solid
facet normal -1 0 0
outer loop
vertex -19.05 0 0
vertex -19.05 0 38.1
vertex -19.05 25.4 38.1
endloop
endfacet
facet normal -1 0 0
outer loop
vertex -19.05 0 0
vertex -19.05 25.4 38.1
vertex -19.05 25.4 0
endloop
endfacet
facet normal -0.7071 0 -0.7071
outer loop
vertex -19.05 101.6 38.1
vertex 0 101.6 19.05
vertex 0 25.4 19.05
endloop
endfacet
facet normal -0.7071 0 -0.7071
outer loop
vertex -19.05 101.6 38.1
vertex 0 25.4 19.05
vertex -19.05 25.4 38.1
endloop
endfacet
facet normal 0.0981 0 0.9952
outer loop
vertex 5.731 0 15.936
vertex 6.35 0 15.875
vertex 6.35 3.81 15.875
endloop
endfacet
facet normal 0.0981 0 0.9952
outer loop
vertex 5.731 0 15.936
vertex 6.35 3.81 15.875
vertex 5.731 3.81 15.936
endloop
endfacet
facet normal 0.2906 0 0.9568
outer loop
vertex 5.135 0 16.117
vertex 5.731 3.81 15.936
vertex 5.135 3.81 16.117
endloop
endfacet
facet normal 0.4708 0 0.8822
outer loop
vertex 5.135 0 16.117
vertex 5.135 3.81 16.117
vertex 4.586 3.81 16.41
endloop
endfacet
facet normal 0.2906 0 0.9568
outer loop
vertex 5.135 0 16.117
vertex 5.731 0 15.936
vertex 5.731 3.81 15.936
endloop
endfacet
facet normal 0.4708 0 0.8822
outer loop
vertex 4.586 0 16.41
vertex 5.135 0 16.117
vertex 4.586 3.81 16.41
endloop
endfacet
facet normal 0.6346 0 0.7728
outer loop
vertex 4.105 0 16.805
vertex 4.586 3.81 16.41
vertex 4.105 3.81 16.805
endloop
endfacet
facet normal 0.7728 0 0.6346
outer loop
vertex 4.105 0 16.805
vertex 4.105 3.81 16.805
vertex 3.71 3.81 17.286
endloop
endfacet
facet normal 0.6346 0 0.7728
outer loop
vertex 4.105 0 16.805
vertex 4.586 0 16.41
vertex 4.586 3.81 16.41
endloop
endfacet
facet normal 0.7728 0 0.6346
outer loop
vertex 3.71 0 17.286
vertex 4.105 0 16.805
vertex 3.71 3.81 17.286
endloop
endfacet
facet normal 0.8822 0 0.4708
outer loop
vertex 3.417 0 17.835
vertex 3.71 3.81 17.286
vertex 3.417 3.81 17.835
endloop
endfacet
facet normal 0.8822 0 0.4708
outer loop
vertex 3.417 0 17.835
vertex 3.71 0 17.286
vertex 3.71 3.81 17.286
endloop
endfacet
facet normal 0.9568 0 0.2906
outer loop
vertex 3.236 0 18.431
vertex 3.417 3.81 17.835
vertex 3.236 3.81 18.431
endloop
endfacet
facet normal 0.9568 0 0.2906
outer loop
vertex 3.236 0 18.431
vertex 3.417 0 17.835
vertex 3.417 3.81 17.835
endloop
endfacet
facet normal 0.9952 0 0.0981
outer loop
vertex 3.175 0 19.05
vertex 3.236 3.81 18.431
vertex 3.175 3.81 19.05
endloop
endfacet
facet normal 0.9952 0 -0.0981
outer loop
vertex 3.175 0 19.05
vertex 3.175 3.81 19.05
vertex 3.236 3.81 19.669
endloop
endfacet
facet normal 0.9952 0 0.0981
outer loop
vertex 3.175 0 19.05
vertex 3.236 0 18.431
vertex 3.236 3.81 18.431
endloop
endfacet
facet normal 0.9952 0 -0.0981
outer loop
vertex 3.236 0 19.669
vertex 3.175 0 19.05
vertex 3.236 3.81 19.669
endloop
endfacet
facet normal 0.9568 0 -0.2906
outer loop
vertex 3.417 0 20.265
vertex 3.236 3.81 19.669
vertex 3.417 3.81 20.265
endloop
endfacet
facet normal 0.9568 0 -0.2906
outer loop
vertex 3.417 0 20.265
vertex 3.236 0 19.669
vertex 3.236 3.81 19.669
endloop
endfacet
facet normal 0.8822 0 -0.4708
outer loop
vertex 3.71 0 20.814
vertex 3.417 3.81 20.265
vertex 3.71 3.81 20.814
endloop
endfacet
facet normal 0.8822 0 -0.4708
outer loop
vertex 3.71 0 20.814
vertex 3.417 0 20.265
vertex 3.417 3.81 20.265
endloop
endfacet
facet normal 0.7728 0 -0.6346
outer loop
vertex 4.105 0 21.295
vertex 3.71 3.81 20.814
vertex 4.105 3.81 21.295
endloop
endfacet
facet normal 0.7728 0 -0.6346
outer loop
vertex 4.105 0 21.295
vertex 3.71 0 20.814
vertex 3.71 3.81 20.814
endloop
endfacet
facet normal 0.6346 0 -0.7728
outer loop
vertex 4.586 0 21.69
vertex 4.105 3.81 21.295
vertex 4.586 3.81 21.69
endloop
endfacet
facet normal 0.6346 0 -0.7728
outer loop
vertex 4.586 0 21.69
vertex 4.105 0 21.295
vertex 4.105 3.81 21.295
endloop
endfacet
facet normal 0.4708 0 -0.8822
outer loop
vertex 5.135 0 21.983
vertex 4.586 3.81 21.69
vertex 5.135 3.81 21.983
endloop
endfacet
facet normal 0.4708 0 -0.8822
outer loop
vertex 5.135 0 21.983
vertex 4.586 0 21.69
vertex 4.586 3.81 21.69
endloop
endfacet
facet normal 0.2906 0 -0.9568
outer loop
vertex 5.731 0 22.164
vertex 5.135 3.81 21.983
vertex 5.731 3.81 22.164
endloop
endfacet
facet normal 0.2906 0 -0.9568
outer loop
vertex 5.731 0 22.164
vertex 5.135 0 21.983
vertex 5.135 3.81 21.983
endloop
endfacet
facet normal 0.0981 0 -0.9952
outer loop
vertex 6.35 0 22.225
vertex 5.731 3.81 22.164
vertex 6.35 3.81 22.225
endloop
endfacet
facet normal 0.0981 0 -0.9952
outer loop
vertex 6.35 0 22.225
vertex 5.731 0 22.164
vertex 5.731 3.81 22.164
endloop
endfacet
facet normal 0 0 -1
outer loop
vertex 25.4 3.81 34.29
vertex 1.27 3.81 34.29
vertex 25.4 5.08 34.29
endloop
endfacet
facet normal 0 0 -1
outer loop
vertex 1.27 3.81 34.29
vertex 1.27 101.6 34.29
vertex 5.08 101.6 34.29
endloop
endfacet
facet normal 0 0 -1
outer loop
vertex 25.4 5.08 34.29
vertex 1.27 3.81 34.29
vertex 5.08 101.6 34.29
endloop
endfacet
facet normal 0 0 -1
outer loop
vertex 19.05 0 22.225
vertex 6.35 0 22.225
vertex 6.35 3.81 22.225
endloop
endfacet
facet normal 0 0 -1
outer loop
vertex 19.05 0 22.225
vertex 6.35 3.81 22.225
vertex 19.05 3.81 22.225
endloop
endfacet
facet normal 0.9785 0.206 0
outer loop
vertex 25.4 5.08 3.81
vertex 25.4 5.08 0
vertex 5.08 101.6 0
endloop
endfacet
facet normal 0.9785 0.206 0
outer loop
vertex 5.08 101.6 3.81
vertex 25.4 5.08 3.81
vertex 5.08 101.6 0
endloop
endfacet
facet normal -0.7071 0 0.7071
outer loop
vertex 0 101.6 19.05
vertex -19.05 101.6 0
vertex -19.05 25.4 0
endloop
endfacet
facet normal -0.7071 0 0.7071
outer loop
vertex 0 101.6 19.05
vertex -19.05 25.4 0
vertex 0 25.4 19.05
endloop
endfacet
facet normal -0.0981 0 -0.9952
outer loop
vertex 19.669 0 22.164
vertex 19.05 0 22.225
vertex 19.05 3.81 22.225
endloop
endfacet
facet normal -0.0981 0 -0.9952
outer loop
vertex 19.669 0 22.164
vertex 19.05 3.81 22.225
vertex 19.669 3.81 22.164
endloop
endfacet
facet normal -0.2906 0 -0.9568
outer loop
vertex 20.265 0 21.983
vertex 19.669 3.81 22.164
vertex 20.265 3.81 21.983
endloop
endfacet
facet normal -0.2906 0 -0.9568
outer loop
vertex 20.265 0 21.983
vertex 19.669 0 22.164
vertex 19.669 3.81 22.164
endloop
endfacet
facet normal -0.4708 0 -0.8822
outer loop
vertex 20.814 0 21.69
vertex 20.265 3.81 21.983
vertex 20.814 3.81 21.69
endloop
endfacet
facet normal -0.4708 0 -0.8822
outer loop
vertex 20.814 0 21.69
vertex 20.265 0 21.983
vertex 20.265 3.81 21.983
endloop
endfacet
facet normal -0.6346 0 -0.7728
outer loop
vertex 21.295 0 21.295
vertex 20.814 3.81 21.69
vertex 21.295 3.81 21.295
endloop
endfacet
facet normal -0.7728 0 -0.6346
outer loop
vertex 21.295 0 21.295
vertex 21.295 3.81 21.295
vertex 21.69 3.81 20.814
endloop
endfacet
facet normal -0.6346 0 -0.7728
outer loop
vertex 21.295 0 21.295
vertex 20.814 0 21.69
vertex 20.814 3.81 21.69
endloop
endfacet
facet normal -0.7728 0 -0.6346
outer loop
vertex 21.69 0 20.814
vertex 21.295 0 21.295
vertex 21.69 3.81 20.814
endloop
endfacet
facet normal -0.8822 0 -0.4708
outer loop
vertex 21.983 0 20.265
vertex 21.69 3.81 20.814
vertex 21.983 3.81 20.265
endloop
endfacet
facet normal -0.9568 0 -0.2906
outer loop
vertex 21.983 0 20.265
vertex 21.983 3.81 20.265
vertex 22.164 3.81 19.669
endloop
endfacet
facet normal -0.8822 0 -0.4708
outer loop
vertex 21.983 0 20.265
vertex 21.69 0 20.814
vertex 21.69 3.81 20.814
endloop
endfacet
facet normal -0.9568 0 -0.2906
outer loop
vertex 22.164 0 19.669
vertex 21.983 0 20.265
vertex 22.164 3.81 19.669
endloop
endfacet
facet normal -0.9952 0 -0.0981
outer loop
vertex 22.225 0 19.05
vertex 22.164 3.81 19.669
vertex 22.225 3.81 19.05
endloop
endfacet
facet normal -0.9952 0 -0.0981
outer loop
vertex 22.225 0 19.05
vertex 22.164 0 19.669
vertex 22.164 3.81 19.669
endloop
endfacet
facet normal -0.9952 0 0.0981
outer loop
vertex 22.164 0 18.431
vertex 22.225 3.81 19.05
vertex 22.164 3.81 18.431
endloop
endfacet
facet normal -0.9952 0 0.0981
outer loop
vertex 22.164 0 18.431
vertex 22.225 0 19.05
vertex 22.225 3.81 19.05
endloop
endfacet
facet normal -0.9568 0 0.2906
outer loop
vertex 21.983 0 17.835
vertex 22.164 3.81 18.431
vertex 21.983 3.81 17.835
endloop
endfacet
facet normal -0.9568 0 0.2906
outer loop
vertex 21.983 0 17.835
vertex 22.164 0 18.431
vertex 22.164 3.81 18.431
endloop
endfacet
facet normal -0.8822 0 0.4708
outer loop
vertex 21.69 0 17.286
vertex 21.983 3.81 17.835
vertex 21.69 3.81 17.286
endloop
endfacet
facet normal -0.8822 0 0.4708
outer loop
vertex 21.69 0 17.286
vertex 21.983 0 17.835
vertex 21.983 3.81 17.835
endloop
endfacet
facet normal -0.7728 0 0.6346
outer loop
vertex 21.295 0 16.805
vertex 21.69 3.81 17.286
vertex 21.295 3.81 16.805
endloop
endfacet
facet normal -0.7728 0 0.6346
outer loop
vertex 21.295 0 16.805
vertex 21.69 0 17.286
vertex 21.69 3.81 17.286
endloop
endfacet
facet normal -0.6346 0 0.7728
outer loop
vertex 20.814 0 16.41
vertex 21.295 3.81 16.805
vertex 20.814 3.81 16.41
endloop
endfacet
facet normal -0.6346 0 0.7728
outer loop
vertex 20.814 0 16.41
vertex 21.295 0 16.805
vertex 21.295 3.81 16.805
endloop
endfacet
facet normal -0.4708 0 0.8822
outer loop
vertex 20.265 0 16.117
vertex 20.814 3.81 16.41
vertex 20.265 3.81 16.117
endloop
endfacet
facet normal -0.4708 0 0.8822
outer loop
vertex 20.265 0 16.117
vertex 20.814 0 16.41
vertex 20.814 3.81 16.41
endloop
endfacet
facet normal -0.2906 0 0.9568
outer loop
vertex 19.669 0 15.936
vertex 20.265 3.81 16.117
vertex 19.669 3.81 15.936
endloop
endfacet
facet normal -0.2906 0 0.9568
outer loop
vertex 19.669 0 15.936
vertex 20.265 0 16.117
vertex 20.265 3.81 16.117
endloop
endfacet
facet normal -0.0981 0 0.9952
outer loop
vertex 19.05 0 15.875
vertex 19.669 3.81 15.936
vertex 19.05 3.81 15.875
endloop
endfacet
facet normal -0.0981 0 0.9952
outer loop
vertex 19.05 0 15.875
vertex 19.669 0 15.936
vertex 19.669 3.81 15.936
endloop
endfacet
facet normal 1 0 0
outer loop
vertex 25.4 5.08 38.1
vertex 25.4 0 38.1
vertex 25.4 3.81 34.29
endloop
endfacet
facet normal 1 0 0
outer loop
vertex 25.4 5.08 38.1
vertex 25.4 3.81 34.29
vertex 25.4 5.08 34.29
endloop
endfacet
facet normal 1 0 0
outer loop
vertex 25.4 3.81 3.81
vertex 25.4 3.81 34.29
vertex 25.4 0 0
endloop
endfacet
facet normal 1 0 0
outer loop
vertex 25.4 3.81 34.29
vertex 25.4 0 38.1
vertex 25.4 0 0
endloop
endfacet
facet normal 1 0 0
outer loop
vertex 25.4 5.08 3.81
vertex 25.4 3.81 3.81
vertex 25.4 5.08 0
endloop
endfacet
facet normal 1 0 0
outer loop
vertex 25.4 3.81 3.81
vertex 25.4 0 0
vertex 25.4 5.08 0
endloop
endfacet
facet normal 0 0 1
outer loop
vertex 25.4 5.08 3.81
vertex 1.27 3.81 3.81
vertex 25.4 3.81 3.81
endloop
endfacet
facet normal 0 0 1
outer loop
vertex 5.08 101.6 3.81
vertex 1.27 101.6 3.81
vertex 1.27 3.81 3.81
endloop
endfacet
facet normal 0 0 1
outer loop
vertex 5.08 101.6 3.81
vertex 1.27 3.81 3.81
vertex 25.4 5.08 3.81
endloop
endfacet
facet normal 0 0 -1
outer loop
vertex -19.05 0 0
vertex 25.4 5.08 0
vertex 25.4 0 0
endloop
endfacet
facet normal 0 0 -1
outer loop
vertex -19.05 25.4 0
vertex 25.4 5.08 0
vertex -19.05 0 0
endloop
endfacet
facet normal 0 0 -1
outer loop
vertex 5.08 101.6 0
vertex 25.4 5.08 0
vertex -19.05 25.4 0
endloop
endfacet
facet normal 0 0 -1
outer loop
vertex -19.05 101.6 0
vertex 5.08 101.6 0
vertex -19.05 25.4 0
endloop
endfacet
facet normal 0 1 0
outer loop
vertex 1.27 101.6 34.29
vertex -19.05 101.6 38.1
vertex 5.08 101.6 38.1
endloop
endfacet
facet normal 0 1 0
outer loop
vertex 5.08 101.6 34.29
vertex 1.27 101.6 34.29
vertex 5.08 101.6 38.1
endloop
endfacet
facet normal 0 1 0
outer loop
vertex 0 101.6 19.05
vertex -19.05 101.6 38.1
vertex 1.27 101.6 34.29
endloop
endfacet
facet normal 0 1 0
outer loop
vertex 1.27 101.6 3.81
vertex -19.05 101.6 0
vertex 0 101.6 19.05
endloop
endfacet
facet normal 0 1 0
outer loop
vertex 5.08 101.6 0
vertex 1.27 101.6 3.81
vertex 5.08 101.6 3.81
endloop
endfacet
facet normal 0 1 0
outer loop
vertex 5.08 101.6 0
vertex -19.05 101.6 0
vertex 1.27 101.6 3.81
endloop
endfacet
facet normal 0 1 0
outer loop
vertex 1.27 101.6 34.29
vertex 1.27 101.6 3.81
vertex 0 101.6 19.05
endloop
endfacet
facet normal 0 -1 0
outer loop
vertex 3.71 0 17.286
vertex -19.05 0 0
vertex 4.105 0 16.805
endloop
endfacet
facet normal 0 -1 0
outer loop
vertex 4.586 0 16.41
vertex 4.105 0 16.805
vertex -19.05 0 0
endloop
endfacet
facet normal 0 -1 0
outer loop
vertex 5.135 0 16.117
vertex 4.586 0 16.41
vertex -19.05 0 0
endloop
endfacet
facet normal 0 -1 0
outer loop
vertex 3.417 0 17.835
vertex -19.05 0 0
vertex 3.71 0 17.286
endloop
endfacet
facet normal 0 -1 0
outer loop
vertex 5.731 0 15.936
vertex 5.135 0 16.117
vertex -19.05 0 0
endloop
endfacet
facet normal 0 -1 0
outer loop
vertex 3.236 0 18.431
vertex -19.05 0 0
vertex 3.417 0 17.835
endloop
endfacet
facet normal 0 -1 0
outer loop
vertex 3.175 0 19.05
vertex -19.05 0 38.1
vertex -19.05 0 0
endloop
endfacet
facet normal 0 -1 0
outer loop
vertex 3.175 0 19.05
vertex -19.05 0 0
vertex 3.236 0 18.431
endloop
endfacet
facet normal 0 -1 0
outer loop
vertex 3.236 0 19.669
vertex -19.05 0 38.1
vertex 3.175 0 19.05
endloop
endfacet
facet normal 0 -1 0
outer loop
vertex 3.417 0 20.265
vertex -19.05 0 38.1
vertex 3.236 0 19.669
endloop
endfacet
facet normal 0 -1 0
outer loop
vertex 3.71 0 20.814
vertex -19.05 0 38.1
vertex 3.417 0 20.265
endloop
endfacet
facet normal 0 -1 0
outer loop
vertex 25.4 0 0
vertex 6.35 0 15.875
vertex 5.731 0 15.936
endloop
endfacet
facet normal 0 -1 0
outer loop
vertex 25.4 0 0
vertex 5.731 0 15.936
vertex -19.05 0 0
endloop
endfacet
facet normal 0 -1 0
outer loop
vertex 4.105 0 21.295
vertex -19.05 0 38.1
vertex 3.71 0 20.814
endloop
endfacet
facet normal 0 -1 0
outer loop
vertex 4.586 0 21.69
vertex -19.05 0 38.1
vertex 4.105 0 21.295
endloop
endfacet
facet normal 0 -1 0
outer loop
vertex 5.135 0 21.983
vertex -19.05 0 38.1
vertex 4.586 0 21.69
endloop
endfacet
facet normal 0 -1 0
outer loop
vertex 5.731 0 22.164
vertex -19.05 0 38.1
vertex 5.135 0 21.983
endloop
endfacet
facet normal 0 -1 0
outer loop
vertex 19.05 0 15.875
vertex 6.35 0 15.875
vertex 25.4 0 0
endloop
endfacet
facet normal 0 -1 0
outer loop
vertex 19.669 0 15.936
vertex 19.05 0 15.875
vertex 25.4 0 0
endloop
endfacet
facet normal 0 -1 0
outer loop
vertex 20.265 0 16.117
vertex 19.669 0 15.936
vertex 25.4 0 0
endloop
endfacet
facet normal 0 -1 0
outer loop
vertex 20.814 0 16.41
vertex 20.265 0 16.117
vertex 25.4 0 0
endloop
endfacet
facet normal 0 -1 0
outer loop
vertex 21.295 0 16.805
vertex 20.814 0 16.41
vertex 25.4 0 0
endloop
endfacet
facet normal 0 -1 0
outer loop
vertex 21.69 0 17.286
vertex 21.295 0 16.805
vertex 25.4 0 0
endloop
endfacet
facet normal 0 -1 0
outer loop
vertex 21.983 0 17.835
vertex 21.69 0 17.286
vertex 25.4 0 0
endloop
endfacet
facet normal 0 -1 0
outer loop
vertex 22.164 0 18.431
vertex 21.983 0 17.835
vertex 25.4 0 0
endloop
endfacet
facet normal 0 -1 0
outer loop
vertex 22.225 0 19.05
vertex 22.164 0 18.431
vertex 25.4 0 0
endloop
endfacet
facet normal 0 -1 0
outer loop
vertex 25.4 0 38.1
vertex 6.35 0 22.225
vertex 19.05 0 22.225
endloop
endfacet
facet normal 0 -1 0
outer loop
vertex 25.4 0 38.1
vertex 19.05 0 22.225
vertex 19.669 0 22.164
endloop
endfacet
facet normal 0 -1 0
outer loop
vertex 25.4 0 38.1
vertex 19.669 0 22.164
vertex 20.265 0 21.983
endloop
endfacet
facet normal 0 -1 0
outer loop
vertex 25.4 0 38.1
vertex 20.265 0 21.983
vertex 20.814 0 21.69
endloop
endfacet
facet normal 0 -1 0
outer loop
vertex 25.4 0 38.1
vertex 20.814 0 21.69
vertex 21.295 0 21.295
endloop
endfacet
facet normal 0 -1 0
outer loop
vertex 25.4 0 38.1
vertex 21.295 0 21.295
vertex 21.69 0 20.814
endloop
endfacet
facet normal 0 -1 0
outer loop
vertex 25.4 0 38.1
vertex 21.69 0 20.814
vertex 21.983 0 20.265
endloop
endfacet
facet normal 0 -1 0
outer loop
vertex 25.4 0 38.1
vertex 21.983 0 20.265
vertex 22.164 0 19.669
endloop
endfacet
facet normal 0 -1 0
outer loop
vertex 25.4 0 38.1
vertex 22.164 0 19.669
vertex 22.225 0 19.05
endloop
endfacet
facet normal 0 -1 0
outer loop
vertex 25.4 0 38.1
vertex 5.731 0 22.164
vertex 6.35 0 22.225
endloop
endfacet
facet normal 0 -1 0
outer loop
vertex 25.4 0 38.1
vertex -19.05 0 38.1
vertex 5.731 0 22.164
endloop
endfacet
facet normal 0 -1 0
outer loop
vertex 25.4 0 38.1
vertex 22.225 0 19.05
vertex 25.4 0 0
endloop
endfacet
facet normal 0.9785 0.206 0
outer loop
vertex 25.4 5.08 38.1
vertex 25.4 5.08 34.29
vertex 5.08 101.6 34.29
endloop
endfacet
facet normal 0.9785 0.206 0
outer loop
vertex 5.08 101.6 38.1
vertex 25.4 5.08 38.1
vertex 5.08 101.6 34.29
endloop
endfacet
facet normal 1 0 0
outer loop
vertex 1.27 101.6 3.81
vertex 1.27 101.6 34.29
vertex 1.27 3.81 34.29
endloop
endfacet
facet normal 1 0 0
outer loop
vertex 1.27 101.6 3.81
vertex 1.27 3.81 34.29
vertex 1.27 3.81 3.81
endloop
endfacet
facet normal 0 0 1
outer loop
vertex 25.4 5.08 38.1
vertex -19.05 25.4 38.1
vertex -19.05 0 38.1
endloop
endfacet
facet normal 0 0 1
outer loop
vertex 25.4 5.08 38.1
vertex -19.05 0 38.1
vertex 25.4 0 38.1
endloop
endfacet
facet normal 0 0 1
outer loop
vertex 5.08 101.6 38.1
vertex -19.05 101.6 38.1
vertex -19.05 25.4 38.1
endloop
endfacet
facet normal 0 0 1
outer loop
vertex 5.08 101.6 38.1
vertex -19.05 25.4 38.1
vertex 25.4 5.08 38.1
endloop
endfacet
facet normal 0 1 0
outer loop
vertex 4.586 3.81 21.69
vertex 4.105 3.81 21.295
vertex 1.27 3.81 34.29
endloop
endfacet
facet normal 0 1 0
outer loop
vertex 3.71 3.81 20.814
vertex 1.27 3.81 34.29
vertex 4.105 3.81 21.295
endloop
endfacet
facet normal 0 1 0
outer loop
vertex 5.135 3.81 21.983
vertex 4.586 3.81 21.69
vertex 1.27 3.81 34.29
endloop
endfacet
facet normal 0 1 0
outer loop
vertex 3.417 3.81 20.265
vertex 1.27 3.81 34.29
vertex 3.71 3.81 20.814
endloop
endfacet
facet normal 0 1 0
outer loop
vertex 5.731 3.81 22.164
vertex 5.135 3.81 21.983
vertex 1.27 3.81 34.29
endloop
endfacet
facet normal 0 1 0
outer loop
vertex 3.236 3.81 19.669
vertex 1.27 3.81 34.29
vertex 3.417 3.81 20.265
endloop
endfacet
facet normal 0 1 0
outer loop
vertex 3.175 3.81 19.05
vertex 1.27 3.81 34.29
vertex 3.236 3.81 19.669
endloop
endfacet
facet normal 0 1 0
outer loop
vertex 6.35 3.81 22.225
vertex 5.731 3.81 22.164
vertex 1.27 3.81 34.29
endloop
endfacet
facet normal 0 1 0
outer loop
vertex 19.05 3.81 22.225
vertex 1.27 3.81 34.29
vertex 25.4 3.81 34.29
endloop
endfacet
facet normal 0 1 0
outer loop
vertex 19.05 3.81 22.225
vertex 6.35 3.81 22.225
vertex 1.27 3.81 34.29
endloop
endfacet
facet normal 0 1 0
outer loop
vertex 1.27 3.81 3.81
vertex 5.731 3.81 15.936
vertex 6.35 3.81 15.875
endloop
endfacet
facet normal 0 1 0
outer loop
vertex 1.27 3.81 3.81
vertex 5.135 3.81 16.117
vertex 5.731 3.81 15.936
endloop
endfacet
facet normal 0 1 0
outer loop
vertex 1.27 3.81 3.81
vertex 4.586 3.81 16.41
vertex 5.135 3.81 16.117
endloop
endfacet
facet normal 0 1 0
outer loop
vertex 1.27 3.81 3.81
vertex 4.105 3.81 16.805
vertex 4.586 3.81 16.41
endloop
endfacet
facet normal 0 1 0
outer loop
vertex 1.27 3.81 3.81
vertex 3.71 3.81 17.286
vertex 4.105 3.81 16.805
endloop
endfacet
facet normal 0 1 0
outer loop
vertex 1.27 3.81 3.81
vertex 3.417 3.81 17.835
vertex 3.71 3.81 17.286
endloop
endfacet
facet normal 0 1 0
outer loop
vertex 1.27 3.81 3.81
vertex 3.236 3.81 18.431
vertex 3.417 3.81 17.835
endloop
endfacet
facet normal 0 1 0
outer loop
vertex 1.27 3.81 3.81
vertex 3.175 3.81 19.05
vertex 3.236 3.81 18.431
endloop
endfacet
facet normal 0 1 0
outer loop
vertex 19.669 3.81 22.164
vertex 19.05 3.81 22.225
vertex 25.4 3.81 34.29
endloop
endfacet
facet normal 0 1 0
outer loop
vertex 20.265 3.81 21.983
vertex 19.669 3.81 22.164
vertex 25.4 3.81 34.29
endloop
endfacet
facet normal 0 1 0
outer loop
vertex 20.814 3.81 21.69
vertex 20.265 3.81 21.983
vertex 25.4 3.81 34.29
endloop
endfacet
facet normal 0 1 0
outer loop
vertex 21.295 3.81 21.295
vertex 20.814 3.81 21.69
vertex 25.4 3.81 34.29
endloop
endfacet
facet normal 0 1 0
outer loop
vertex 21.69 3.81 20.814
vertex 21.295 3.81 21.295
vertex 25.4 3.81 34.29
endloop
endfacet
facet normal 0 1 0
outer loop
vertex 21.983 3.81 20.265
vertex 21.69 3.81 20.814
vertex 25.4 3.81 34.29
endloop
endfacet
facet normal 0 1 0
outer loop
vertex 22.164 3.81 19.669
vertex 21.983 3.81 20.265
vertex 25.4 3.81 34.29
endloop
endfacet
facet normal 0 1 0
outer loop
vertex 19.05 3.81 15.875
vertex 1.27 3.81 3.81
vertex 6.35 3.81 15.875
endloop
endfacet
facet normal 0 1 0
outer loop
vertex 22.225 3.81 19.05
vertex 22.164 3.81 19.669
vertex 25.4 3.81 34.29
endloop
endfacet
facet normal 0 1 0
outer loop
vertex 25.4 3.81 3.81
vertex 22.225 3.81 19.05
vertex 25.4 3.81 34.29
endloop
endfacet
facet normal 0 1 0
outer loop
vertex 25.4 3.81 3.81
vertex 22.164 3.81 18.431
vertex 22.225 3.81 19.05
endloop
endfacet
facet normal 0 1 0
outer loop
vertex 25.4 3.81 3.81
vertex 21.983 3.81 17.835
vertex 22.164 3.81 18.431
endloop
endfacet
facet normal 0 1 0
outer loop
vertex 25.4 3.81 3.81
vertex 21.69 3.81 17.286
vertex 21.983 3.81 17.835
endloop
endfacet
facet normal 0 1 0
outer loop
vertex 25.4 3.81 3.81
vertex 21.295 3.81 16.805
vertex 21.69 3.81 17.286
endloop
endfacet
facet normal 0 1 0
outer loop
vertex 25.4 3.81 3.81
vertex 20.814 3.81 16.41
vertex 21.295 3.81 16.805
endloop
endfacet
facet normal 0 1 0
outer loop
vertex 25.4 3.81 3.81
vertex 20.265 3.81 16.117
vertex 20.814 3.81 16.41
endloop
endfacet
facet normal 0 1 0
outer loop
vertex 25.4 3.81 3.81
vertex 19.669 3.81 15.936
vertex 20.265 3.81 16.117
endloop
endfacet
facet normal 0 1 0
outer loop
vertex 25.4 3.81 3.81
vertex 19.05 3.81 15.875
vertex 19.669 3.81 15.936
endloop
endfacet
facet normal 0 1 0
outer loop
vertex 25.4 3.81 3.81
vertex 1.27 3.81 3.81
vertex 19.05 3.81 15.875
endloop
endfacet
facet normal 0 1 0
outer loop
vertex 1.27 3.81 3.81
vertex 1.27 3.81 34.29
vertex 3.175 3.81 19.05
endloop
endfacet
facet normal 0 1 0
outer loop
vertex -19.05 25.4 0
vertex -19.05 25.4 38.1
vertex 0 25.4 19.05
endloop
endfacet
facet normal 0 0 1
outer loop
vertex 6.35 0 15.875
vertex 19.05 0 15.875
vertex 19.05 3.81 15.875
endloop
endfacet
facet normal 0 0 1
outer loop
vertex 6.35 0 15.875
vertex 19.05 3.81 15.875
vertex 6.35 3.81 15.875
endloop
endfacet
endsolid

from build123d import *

# Parameters (mm, degrees)
BOSS_EXTRUDE1_DEPTH = 38.1
SHELL1_T            = -3.81
CUT_EXTRUDE1_DEPTH  = 3.81
BOSS_EXTRUDE2_DEPTH = 101.6
SKETCH5_W           = 24.13
SKETCH5_H           = 30.48
CUT_EXTRUDE2_DEPTH  = 97.79
BOSS_EXTRUDE3_DEPTH = 25.4


with BuildPart() as part:
    # Sketch1 → Boss-Extrude1 (new body)
    with BuildSketch(Plane.XY):
        Polygon((0, 0), (25.4, 0), (25.4, 5.08), (5.08, 101.6), (0, 101.6), align=None)
    extrude(amount=BOSS_EXTRUDE1_DEPTH)

    # Shell1
    shell1_openings = [part.faces().sort_by_distance(p)[0] for p in [
        (15.24, 53.34, 19.05),
    ]]
    offset(amount=SHELL1_T, openings=shell1_openings, kind=Kind.INTERSECTION)

    # Sketch2 → Cut-Extrude1 (cut)
    with BuildSketch(Plane.XZ):
        with BuildLine():
            Line((6.35, 22.225), (19.05, 22.225))
            ThreePointArc((19.05, 22.225), (22.225, 19.05), (19.05, 15.875))
            Line((19.05, 15.875), (6.35, 15.875))
            ThreePointArc((6.35, 15.875), (3.175, 19.05), (6.35, 22.225))
        make_face()
    extrude(amount=-CUT_EXTRUDE1_DEPTH, mode=Mode.SUBTRACT)

    # Sketch3 → Boss-Extrude2 (add)
    with BuildSketch(Plane(origin=(0, 101.6, 0), x_dir=(1, 0, 0), z_dir=(0, 1, 0))):
        Polygon((-19.05, 0), (0, -19.05), (0, 0), align=None)
        Polygon((0, -38.1), (0, -19.05), (-19.05, -38.1), align=None)
    extrude(amount=-BOSS_EXTRUDE2_DEPTH)

    # Sketch5 → Cut-Extrude2 (cut)
    with BuildSketch(Plane(origin=(0, 101.6, 0), x_dir=(1, 0, 0), z_dir=(0, 1, 0))):
        with Locations((13.335, -19.05)):
            Rectangle(SKETCH5_W, SKETCH5_H)
    extrude(amount=-CUT_EXTRUDE2_DEPTH, mode=Mode.SUBTRACT)

    # Sketch6 → Boss-Extrude3 (add)
    with BuildSketch(Plane.XZ):
        Polygon((-19.05, 0), (0, 19.05), (-19.05, 38.1), align=None)
    extrude(amount=-BOSS_EXTRUDE3_DEPTH)


solid = part.part
